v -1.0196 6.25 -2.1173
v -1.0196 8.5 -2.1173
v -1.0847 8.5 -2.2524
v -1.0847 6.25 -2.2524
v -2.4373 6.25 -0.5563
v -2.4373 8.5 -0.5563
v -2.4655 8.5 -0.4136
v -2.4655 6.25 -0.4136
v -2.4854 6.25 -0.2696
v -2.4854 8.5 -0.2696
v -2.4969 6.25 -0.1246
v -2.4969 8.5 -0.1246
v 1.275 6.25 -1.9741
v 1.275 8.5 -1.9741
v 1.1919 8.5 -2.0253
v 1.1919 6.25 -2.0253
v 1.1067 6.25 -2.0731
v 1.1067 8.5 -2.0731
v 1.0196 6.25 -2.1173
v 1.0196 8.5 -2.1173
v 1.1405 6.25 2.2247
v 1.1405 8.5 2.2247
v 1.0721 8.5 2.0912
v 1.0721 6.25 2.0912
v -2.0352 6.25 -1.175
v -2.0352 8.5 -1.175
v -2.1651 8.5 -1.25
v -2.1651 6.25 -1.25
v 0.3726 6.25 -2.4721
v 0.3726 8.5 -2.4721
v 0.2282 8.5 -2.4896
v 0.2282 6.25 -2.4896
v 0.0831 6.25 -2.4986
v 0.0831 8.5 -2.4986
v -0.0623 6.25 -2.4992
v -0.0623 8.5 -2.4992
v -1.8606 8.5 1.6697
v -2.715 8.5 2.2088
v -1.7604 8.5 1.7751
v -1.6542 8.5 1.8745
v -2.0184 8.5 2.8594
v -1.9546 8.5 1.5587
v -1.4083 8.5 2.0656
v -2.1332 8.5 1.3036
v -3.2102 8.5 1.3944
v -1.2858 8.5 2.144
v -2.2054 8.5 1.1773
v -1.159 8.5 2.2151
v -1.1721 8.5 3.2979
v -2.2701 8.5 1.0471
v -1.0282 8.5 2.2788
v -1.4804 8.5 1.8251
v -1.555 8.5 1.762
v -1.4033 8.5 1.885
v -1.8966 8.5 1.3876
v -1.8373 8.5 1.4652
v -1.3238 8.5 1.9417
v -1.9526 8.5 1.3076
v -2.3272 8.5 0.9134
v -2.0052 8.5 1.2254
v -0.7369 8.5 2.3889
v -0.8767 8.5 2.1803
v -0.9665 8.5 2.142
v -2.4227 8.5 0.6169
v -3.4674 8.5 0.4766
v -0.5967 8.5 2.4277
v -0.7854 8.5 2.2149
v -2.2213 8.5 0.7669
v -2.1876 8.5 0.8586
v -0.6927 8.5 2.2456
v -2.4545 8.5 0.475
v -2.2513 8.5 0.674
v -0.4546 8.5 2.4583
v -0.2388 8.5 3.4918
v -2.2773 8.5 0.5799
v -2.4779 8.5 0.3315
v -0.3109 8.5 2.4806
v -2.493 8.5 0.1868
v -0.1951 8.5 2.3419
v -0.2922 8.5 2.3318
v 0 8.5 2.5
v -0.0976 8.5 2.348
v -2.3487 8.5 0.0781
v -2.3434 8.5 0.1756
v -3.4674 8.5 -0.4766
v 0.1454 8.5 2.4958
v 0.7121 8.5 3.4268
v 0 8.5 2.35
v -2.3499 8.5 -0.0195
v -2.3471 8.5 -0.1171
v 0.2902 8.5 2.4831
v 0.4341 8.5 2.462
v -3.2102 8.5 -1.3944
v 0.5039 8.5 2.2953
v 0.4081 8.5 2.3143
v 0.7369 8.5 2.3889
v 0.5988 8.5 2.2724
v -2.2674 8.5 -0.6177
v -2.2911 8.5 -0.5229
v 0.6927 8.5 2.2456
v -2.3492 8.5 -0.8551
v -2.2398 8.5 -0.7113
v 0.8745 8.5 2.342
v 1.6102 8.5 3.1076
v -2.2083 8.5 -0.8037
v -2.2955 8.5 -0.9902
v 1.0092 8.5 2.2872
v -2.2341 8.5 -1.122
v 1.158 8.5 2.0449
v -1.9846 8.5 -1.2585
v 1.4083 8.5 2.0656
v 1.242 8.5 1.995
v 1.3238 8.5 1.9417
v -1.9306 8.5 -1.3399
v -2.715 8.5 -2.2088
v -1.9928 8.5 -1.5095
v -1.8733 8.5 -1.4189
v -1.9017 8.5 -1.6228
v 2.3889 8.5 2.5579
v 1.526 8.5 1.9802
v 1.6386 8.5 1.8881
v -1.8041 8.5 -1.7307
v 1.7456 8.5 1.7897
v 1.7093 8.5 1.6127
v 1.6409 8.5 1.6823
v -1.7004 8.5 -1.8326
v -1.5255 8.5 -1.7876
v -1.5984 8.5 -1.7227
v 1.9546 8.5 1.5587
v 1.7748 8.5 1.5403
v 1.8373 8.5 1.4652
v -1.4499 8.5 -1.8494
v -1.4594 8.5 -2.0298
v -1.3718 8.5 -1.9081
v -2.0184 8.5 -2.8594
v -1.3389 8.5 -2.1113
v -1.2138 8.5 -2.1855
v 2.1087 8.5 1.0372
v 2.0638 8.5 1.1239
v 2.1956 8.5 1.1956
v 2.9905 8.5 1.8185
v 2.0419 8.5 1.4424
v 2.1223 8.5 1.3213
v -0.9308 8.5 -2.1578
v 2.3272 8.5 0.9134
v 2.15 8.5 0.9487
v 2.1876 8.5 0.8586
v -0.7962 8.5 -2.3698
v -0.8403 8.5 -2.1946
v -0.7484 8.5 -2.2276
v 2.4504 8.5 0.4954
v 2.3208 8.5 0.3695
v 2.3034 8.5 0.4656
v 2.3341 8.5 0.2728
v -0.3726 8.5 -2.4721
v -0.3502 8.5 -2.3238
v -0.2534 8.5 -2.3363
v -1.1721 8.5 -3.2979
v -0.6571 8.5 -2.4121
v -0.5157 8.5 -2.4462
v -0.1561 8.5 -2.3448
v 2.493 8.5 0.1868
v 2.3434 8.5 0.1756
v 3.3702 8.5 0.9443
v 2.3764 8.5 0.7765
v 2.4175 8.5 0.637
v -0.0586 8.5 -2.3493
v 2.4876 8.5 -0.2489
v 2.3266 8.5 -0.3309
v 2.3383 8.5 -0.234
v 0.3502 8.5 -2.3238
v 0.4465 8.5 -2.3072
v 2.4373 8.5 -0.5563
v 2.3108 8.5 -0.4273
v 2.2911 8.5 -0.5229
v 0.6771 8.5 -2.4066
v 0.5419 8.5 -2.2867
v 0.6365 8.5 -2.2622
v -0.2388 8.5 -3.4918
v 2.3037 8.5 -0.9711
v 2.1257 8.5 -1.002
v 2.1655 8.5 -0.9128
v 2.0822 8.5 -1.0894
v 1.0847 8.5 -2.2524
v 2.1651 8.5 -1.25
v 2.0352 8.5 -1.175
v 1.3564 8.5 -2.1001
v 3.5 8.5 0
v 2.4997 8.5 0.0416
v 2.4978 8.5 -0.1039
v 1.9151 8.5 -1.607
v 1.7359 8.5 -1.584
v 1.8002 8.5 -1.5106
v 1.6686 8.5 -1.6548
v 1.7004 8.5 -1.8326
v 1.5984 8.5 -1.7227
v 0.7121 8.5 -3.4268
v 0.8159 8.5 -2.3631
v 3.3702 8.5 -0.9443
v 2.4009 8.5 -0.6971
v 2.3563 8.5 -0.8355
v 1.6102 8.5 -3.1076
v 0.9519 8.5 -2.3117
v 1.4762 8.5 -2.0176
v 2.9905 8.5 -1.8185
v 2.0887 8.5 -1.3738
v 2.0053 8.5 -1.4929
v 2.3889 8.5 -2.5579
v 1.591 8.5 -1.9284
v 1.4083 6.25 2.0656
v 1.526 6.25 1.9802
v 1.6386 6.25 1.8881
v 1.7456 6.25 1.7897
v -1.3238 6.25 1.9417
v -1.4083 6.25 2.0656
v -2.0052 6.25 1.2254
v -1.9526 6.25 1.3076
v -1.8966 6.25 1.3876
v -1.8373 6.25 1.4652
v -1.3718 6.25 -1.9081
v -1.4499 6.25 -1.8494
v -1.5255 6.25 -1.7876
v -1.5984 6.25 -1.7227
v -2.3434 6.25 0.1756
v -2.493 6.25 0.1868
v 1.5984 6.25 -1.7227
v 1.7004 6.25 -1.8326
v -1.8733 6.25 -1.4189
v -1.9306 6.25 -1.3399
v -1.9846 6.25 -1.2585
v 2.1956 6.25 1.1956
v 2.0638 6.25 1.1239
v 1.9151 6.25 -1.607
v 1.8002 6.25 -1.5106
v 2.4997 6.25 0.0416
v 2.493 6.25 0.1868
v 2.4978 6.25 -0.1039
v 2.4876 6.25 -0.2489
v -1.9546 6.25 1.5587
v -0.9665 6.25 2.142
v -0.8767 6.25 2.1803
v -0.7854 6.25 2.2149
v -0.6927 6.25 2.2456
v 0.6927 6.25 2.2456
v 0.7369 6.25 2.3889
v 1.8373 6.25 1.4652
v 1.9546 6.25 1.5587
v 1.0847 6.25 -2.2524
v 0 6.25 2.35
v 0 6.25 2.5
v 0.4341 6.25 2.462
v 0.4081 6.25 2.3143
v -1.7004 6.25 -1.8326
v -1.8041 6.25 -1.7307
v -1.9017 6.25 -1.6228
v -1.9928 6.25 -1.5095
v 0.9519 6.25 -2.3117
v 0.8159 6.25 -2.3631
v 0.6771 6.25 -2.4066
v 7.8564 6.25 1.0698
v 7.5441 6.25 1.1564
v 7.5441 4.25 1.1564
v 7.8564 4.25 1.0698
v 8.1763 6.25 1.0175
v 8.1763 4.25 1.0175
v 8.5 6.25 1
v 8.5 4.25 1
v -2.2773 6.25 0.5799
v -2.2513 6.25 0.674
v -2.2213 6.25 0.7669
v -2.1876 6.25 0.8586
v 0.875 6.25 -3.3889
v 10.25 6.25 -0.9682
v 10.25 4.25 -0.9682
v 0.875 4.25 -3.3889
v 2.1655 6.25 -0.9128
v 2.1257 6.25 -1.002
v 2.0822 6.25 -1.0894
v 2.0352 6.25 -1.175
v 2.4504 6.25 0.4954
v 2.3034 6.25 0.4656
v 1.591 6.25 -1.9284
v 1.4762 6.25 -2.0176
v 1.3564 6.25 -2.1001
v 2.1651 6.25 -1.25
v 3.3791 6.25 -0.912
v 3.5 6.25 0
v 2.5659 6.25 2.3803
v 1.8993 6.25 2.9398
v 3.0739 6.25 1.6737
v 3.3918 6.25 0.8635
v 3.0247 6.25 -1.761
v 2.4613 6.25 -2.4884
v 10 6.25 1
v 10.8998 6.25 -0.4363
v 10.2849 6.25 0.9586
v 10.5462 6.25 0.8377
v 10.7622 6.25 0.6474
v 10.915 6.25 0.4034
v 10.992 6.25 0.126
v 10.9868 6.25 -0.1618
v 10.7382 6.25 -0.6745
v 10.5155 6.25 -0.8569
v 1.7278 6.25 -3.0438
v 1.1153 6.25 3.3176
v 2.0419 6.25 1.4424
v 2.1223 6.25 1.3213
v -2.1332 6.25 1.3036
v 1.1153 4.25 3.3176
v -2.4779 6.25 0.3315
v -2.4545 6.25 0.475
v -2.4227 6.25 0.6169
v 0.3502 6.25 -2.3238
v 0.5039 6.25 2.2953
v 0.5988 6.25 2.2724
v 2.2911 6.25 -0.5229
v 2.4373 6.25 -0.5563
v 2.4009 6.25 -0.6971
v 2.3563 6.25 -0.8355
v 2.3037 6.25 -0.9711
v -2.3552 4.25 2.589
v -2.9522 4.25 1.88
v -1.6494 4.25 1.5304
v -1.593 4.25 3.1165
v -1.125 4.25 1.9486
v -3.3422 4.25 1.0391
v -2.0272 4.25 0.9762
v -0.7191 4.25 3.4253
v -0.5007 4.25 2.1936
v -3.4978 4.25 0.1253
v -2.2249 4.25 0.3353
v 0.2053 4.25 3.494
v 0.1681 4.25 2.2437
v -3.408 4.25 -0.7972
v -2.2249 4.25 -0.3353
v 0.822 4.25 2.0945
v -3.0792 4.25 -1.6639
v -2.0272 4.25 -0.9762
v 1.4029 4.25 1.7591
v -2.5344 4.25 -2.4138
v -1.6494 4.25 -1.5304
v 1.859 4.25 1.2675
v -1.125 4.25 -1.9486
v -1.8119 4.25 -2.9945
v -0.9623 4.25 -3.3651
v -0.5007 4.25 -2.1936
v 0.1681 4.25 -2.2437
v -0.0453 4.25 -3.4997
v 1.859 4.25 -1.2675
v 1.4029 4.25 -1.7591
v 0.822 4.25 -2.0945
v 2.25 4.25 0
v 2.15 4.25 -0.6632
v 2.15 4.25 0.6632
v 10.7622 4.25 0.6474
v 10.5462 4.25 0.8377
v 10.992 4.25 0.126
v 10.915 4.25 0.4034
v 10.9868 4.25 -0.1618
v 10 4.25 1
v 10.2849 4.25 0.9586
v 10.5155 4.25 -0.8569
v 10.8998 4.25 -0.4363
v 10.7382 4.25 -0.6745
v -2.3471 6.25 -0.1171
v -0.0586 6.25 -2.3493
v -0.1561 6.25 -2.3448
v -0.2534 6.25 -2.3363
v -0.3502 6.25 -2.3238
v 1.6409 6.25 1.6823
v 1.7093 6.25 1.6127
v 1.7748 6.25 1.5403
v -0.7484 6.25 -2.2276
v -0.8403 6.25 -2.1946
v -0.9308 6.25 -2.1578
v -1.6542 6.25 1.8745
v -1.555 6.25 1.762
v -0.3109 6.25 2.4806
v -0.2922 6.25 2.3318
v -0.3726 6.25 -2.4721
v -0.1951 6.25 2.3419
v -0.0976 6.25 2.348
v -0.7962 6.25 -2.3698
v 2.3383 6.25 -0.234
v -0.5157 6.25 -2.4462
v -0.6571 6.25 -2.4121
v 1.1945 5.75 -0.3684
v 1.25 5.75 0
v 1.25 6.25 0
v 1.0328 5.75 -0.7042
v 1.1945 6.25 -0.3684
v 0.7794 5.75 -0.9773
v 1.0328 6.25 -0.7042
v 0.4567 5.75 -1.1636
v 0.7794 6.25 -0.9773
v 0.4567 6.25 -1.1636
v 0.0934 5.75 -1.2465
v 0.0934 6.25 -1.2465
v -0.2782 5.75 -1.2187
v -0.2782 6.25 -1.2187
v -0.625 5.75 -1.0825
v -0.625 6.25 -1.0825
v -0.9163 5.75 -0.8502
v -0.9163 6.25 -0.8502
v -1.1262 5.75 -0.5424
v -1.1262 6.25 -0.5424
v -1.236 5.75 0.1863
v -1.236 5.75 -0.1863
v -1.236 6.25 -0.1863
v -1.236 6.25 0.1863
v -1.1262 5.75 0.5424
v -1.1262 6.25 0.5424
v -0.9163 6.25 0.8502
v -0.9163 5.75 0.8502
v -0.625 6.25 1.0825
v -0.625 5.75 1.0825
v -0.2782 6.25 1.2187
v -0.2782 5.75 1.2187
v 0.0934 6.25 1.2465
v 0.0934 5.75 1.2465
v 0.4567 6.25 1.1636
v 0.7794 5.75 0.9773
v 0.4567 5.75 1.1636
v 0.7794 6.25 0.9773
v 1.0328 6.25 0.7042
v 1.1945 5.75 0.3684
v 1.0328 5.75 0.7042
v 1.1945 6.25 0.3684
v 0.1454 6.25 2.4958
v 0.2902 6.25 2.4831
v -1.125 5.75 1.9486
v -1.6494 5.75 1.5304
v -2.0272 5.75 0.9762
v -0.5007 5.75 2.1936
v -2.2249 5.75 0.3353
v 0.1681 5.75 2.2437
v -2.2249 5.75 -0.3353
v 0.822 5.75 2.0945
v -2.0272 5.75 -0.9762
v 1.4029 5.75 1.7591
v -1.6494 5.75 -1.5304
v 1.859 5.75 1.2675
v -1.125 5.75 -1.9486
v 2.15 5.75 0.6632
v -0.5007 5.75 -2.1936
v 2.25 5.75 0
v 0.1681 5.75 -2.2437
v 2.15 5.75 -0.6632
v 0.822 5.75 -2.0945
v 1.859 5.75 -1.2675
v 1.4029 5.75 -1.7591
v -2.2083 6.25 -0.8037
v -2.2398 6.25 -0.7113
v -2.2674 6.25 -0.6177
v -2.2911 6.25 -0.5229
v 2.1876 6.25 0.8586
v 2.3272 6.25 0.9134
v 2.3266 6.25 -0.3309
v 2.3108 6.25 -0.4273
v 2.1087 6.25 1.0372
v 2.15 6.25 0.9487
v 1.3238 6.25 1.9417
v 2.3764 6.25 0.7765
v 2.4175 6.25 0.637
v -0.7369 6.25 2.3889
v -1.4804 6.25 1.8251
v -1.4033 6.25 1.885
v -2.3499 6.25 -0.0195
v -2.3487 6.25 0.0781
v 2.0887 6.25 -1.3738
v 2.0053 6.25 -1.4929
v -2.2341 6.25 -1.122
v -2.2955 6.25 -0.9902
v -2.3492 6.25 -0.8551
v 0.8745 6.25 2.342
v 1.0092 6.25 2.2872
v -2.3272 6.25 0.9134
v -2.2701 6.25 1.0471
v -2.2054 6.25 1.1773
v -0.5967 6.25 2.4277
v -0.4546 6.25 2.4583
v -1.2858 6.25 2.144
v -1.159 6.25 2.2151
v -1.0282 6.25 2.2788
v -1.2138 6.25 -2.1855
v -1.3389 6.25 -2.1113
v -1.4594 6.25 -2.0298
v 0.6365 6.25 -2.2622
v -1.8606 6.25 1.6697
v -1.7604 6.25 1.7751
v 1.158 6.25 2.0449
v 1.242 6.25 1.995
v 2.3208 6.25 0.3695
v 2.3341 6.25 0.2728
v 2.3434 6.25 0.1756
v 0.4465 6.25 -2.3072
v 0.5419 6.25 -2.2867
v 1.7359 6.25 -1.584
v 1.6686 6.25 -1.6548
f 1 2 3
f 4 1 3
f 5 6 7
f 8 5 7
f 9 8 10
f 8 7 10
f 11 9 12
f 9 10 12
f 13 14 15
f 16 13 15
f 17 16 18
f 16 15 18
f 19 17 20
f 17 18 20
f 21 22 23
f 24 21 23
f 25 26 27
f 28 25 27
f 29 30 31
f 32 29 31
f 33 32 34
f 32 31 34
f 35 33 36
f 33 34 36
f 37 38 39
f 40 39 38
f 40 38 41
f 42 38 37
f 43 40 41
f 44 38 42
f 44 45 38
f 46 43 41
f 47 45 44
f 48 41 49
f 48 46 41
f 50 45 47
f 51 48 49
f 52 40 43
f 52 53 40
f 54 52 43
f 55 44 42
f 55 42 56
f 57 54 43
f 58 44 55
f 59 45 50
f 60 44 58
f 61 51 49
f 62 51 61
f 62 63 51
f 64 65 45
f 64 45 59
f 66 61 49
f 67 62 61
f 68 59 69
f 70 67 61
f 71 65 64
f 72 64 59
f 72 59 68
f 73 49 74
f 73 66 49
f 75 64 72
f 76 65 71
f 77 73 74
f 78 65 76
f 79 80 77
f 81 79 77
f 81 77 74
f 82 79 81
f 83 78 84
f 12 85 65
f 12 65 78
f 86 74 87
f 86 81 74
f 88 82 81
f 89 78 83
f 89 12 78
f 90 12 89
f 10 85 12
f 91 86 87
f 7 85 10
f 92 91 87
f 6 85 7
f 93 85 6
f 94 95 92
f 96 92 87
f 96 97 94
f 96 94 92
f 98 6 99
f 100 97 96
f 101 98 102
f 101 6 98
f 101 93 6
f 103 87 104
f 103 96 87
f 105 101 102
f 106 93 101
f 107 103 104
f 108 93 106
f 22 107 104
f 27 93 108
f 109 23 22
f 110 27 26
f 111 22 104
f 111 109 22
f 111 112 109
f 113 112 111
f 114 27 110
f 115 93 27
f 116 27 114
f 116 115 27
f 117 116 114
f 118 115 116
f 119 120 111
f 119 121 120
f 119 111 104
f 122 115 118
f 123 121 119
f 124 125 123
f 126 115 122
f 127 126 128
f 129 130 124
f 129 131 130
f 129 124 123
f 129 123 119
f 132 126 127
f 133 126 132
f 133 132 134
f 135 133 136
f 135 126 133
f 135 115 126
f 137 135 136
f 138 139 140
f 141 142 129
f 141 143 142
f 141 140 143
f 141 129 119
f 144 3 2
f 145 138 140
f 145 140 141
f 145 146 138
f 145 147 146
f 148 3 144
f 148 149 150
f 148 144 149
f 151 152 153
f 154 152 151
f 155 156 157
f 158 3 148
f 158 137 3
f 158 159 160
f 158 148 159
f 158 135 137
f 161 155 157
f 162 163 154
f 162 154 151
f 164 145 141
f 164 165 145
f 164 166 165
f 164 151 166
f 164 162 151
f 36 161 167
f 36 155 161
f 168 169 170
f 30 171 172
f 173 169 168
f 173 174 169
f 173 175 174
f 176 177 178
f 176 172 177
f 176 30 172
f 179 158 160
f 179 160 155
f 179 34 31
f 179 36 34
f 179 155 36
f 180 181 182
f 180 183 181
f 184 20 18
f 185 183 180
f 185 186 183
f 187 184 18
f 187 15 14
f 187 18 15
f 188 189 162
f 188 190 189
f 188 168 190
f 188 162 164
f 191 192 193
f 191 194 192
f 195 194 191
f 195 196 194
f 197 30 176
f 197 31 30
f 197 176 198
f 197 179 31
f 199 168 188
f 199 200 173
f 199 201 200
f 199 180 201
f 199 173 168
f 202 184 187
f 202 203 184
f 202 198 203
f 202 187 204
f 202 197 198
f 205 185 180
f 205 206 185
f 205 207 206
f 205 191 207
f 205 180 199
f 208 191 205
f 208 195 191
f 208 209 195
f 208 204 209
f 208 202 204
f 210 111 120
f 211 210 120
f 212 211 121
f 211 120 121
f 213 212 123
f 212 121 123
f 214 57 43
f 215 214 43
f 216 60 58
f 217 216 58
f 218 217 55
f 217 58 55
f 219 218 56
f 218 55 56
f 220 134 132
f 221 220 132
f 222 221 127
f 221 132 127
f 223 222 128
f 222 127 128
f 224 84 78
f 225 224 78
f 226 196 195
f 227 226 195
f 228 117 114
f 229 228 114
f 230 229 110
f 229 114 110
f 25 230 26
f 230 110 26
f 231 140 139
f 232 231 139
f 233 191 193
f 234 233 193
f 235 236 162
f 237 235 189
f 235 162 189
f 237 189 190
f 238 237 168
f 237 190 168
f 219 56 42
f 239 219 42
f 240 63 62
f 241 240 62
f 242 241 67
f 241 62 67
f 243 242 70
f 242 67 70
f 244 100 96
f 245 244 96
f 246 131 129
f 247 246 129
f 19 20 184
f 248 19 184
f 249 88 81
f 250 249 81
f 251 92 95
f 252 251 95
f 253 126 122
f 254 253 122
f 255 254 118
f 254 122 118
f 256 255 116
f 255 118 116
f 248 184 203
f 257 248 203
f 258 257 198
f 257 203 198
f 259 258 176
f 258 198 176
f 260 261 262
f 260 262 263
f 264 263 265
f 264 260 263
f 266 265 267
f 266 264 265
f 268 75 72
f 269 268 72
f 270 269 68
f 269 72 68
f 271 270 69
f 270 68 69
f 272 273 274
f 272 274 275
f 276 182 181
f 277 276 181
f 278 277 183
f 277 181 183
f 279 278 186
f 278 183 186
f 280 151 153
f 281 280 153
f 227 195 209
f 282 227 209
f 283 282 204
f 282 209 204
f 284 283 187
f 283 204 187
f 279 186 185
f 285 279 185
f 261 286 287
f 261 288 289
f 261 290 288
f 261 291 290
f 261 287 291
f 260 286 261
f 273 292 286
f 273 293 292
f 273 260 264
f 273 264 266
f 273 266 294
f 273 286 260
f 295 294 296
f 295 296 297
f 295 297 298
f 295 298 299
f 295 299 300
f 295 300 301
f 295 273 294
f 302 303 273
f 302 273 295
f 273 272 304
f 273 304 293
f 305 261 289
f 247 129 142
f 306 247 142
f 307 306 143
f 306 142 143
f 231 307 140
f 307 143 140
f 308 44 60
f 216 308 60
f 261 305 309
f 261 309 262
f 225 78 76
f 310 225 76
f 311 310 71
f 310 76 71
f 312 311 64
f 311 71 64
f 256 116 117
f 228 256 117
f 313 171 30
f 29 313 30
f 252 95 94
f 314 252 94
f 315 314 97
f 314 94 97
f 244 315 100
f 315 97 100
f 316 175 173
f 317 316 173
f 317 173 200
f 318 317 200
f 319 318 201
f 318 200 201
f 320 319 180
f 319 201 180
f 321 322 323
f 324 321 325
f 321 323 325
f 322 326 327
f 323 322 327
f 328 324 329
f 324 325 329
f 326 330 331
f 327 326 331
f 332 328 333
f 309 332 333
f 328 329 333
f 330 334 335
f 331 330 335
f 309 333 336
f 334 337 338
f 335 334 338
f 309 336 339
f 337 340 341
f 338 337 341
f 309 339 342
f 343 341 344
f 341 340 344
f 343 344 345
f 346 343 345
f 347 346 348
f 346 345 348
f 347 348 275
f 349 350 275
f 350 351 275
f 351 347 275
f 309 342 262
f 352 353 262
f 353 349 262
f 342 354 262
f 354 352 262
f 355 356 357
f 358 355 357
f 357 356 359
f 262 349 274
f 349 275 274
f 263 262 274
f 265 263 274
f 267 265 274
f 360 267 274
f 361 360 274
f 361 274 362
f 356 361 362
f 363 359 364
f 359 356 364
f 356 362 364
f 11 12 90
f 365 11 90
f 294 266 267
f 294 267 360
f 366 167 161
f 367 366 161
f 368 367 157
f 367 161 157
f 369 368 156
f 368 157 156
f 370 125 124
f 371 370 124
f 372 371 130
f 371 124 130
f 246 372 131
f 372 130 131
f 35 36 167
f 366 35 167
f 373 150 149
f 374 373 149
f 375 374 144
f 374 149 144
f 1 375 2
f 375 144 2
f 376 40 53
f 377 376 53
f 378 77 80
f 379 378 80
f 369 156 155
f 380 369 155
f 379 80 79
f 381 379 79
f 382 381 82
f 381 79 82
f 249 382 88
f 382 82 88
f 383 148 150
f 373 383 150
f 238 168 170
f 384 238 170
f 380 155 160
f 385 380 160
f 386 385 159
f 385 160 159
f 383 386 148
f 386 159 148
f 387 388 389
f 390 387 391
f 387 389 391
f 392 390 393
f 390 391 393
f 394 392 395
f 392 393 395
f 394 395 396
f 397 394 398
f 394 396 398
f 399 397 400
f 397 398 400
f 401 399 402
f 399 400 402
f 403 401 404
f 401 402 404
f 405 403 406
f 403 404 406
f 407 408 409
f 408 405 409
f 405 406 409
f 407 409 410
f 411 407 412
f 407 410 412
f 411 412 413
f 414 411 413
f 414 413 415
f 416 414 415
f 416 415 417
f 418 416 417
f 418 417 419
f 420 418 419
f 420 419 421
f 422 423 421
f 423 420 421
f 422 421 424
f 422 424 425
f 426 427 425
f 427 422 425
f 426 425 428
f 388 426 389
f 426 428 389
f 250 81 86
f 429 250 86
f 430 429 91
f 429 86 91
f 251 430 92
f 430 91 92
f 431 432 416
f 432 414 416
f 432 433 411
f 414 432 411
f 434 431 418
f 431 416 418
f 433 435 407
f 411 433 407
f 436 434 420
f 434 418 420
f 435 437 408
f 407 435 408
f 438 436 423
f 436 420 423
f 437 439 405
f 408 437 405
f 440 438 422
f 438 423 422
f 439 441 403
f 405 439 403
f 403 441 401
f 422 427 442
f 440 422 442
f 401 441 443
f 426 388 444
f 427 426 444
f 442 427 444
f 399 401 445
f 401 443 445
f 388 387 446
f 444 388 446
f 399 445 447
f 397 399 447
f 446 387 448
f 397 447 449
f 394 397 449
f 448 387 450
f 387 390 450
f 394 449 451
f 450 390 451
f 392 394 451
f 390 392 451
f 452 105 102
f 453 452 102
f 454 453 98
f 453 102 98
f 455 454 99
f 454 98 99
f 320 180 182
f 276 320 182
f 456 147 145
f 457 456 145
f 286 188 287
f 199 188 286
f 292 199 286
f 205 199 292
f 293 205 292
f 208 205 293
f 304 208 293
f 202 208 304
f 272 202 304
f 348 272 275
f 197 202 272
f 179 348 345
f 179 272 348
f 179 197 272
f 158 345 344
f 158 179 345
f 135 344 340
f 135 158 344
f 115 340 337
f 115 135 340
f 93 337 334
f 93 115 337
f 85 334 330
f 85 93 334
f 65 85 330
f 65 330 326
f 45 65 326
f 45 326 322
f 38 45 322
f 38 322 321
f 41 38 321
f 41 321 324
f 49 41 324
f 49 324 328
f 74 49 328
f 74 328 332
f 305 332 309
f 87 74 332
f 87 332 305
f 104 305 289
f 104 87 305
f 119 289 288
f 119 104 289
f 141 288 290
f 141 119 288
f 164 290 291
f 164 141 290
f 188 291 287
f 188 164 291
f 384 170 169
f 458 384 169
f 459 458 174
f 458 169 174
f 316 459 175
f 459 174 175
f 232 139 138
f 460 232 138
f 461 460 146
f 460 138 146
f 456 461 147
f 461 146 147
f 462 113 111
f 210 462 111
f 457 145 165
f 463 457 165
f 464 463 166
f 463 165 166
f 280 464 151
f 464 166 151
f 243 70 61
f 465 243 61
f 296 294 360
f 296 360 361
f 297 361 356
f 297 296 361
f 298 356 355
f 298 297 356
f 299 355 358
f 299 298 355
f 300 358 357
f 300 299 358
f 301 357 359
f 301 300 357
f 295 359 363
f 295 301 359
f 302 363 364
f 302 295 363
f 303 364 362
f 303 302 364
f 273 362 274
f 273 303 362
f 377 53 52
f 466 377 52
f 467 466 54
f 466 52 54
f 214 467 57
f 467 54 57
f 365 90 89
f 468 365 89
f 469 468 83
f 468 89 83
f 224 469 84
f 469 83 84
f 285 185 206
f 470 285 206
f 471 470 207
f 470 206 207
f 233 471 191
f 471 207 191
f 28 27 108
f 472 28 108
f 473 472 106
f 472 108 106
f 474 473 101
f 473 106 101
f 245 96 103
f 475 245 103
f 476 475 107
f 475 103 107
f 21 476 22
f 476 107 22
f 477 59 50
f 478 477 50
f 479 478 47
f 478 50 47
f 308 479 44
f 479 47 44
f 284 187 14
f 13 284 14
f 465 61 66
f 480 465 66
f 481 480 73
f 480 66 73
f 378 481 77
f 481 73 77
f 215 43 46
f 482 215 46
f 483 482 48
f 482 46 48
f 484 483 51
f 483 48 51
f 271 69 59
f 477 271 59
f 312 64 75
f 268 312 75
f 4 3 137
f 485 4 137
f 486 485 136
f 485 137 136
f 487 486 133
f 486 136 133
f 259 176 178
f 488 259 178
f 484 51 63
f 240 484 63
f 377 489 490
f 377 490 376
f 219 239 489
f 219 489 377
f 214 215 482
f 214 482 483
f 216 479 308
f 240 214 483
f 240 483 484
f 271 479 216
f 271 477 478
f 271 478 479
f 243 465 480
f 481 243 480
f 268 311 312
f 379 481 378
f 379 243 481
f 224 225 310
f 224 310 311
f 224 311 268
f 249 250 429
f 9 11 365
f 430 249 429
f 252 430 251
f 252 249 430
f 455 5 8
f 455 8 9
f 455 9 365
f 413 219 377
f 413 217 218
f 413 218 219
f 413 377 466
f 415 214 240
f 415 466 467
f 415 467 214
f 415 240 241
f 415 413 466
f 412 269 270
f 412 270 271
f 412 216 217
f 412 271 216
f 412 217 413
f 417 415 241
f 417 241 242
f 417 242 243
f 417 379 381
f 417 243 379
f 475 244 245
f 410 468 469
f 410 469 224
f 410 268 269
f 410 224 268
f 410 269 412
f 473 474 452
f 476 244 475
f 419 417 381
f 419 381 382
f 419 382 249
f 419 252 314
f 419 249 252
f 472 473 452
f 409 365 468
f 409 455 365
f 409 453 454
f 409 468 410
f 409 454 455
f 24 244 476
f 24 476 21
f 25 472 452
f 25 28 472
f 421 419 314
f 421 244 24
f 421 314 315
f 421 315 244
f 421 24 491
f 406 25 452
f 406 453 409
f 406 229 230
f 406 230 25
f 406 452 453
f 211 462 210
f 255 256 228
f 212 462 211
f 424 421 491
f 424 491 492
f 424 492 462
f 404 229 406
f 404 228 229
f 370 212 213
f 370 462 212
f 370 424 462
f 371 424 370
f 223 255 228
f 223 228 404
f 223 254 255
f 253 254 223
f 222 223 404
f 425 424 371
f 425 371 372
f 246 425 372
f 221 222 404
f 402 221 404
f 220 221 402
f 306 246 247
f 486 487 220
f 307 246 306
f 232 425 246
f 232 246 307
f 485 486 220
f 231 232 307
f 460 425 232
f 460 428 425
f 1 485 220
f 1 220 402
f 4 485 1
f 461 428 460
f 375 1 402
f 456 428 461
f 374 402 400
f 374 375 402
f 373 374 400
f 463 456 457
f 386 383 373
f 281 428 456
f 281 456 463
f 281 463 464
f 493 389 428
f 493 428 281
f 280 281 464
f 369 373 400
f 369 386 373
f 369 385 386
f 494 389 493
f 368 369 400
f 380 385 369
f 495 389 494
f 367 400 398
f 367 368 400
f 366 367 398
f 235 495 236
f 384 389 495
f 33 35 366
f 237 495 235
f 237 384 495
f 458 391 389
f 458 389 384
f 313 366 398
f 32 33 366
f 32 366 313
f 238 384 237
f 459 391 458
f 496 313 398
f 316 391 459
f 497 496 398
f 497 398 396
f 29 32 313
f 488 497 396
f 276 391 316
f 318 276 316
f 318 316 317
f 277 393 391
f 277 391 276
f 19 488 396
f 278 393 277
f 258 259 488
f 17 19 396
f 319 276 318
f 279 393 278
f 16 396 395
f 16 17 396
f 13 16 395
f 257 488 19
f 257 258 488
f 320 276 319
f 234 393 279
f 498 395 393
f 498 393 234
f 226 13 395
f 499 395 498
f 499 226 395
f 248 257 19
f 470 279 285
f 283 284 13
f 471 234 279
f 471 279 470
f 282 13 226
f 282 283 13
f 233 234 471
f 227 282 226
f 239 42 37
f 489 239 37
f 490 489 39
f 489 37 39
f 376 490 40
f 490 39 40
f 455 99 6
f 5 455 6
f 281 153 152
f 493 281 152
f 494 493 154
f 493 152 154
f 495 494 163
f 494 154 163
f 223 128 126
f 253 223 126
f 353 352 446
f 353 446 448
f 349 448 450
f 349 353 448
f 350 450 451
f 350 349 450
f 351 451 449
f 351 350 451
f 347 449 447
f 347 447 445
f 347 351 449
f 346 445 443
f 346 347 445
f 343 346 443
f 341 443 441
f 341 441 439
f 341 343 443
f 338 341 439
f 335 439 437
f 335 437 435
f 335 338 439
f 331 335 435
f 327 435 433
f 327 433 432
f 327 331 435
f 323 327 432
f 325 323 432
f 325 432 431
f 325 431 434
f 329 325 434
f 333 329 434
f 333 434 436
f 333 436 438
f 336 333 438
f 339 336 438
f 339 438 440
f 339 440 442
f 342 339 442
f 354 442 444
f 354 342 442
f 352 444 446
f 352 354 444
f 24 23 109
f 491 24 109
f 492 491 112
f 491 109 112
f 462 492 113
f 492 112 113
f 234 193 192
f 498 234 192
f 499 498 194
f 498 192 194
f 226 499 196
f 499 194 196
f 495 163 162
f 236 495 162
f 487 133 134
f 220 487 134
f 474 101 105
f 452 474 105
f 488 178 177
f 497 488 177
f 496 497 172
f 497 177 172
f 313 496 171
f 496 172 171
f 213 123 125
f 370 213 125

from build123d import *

# Parameters (mm, degrees)
SKETCH1_R           = 3.5
SKETCH1_R_2         = 2.5
BOSS_EXTRUDE1_DEPTH = 2.25
BOSS_EXTRUDE4_DEPTH = 2.25
BOSS_EXTRUDE2_START = 2.25
BOSS_EXTRUDE2_DEPTH = 2
SKETCH3_R           = 3.5
SKETCH3_R_2         = 1.25
BOSS_EXTRUDE3_DEPTH = 2
SKETCH4_R           = 2.25
CUT_EXTRUDE1_DEPTH  = 1.5


with BuildPart() as part:
    # Sketch1 → Boss-Extrude1 (new body)
    with BuildSketch(Plane(origin=(0, 0, 0), x_dir=(1, 0, 0), z_dir=(0, 1, 0))):
        Circle(SKETCH1_R)
        Circle(SKETCH1_R_2, mode=Mode.SUBTRACT)
    extrude(amount=BOSS_EXTRUDE1_DEPTH)

    # Sketch6 → Boss-Extrude4 (add)
    with BuildSketch(Plane.XZ):
        with BuildLine():
            Line((0.434120444, 2.462019383), (0.408073218, 2.31429822))
            ThreePointArc((0.408073218, 2.31429822), (0.551444891, 2.284383622), (0.69267466, 2.245596094))
            Line((0.69267466, 2.245596094), (0.736887936, 2.388932014))
            ThreePointArc((0.736887936, 2.388932014), (0.586643501, 2.430195342), (0.434120444, 2.462019383))
        make_face()
        with BuildLine():
            Line((1.140526643, 2.224679522), (1.072095045, 2.091198751))
            ThreePointArc((1.072095045, 2.091198751), (1.200279635, 2.020353632), (1.323802136, 1.94166112))
            Line((1.323802136, 1.94166112), (1.408300145, 2.065596936))
            ThreePointArc((1.408300145, 2.065596936), (1.276893228, 2.149312375), (1.140526643, 2.224679522))
        make_face()
        with BuildLine():
            Line((1.745592045, 1.789667123), (1.640856523, 1.682287096))
            ThreePointArc((1.640856523, 1.682287096), (1.742464265, 1.576806356), (1.837303984, 1.465201034))
            Line((1.837303984, 1.465201034), (1.954578706, 1.558724505))
            ThreePointArc((1.954578706, 1.558724505), (1.853685389, 1.67745357), (1.745592045, 1.789667123))
        make_face()
        with BuildLine():
            Line((2.195553933, 1.195634947), (2.063820697, 1.12389685))
            ThreePointArc((2.063820697, 1.12389685), (2.1298233, 0.993152915), (2.187553309, 0.858551407))
            Line((2.187553309, 0.858551407), (2.327184372, 0.913352561))
            ThreePointArc((2.327184372, 0.913352561), (2.265769468, 1.056545654), (2.195553933, 1.195634947))
        make_face()
        with BuildLine():
            Line((2.45043122, 0.495365358), (2.303405346, 0.465643437))
            ThreePointArc((2.303405346, 0.465643437), (2.327938187, 0.32125348), (2.343428923, 0.17561572))
            Line((2.343428923, 0.17561572), (2.493009493, 0.186825234))
            ThreePointArc((2.493009493, 0.186825234), (2.476529986, 0.341759021), (2.45043122, 0.495365358))
        make_face()
        with BuildLine():
            Line((2.487576938, -0.248919616), (2.338322322, -0.23398444))
            ThreePointArc((2.338322322, -0.23398444), (2.31920555, -0.379190737), (2.291080594, -0.522924195))
            Line((2.291080594, -0.522924195), (2.43731978, -0.556302335))
            ThreePointArc((2.43731978, -0.556302335), (2.467239947, -0.403394402), (2.487576938, -0.248919616))
        make_face()
        with BuildLine():
            Line((2.30369053, -0.971086991), (2.165469098, -0.912821771))
            ThreePointArc((2.165469098, -0.912821771), (2.104401323, -1.045942193), (2.035159699, -1.175))
            Line((2.035159699, -1.175), (2.165063509, -1.25))
            ThreePointArc((2.165063509, -1.25), (2.238724812, -1.112704461), (2.30369053, -0.971086991))
        make_face()
        with BuildLine():
            Line((1.915111108, -1.606969024), (1.800204441, -1.510550883))
            ThreePointArc((1.800204441, -1.510550883), (1.702611803, -1.619757095), (1.598405934, -1.722671899))
            Line((1.598405934, -1.722671899), (1.700431844, -1.83262968))
            ThreePointArc((1.700431844, -1.83262968), (1.811289152, -1.723145846), (1.915111108, -1.606969024))
        make_face()
        with BuildLine():
            Line((1.35636566, -2.100064808), (1.27498372, -1.974060919))
            ThreePointArc((1.27498372, -1.974060919), (1.149537753, -2.049649471), (1.019626787, -2.11727684))
            Line((1.019626787, -2.11727684), (1.084709348, -2.25242217))
            ThreePointArc((1.084709348, -2.25242217), (1.222912503, -2.180478161), (1.35636566, -2.100064808))
        make_face()
        with BuildLine():
            Line((0.67710117, -2.406560617), (0.6364751, -2.26216698))
            ThreePointArc((0.6364751, -2.26216698), (0.494322228, -2.297421497), (0.350249326, -2.323752442))
            Line((0.350249326, -2.323752442), (0.372605665, -2.472077066))
            ThreePointArc((0.372605665, -2.472077066), (0.525874711, -2.444065422), (0.67710117, -2.406560617))
        make_face()
        with BuildLine():
            Line((-0.062326729, -2.499222955), (-0.058587126, -2.349269578))
            ThreePointArc((-0.058587126, -2.349269578), (-0.204815995, -2.341057541), (-0.350249326, -2.323752442))
            Line((-0.350249326, -2.323752442), (-0.372605665, -2.472077066))
            ThreePointArc((-0.372605665, -2.472077066), (-0.217889357, -2.490486745), (-0.062326729, -2.499222955))
        make_face()
        with BuildLine():
            Line((-0.796216626, -2.369818365), (-0.748443628, -2.227629263))
            ThreePointArc((-0.748443628, -2.227629263), (-0.885755419, -2.176680348), (-1.019626787, -2.11727684))
            Line((-1.019626787, -2.11727684), (-1.084709348, -2.25242217))
            ThreePointArc((-1.084709348, -2.25242217), (-0.942292999, -2.315617392), (-0.796216626, -2.369818365))
        make_face()
        with BuildLine():
            Line((-1.459359181, -2.029845014), (-1.37179763, -1.908054313))
            ThreePointArc((-1.37179763, -1.908054313), (-1.487991587, -1.818895554), (-1.598405934, -1.722671899))
            Line((-1.598405934, -1.722671899), (-1.700431844, -1.83262968))
            ThreePointArc((-1.700431844, -1.83262968), (-1.582969773, -1.934995271), (-1.459359181, -2.029845014))
        make_face()
        with BuildLine():
            Line((-1.992831268, -1.509511026), (-1.873261392, -1.418940364))
            ThreePointArc((-1.873261392, -1.418940364), (-1.958013172, -1.299493909), (-2.035159699, -1.175))
            Line((-2.035159699, -1.175), (-2.165063509, -1.25))
            ThreePointArc((-2.165063509, -1.25), (-2.082992736, -1.382440328), (-1.992831268, -1.509511026))
        make_face()
        with BuildLine():
            Line((-2.349231552, -0.855050358), (-2.208277659, -0.803747337))
            ThreePointArc((-2.208277659, -0.803747337), (-2.254056694, -0.664626526), (-2.291080594, -0.522924195))
            Line((-2.291080594, -0.522924195), (-2.43731978, -0.556302335))
            ThreePointArc((-2.43731978, -0.556302335), (-2.397932653, -0.707049496), (-2.349231552, -0.855050358))
        make_face()
        with BuildLine():
            Line((-2.496892303, -0.124614714), (-2.347078765, -0.117137831))
            ThreePointArc((-2.347078765, -0.117137831), (-2.349817387, 0.029295839), (-2.343428923, 0.17561572))
            Line((-2.343428923, 0.17561572), (-2.493009493, 0.186825234))
            ThreePointArc((-2.493009493, 0.186825234), (-2.499805731, 0.031165786), (-2.496892303, -0.124614714))
        make_face()
        with BuildLine():
            Line((-2.422693216, 0.616893494), (-2.277331623, 0.579879885))
            ThreePointArc((-2.277331623, 0.579879885), (-2.236786494, 0.720615141), (-2.187553309, 0.858551407))
            Line((-2.187553309, 0.858551407), (-2.327184372, 0.913352561))
            ThreePointArc((-2.327184372, 0.913352561), (-2.3795601, 0.766611852), (-2.422693216, 0.616893494))
        make_face()
        with BuildLine():
            Line((-2.133227204, 1.303588008), (-2.005233572, 1.225372728))
            ThreePointArc((-2.005233572, 1.225372728), (-1.925007304, 1.347904625), (-1.837303984, 1.465201034))
            Line((-1.837303984, 1.465201034), (-1.954578706, 1.558724505))
            ThreePointArc((-1.954578706, 1.558724505), (-2.047880111, 1.433941091), (-2.133227204, 1.303588008))
        make_face()
        with BuildLine():
            Line((-1.654214594, 1.874453007), (-1.554961718, 1.761985827))
            ThreePointArc((-1.554961718, 1.761985827), (-1.442182768, 1.855426869), (-1.323802136, 1.94166112))
            Line((-1.323802136, 1.94166112), (-1.408300145, 2.065596936))
            ThreePointArc((-1.408300145, 2.065596936), (-1.534236987, 1.973858371), (-1.654214594, 1.874453007))
        make_face()
        with BuildLine():
            Line((-1.028217758, 2.278764631), (-0.966524692, 2.142038753))
            ThreePointArc((-0.966524692, 2.142038753), (-0.831213964, 2.198086292), (-0.69267466, 2.245596094))
            Line((-0.69267466, 2.245596094), (-0.736887936, 2.388932014))
            ThreePointArc((-0.736887936, 2.388932014), (-0.884270174, 2.338389672), (-1.028217758, 2.278764631))
        make_face()
        with BuildLine():
            Line((-0.310859262, 2.480598017), (-0.292207706, 2.331762136))
            ThreePointArc((-0.292207706, 2.331762136), (-0.146388151, 2.345436102), (0, 2.35))
            Line((0, 2.35), (0, 2.5))
            ThreePointArc((0, 2.5), (-0.155732076, 2.49514479), (-0.310859262, 2.480598017))
        make_face()
    extrude(amount=-BOSS_EXTRUDE4_DEPTH)



with BuildPart() as body_2:
    # Sketch2 → Boss-Extrude2 (new body)
    with BuildSketch(Plane(origin=(0, 0, 0), x_dir=(1, 0, 0), z_dir=(0, 1, 0)).offset(BOSS_EXTRUDE2_START)):
        with BuildLine():
            Line((10.25, 0.968245837), (0.875, 3.388860428))
            ThreePointArc((0.875, 3.388860428), (3.497755962, 0.12531253), (1.115267765, -3.317556))
            Line((1.115267765, -3.317556), (7.544056202, -1.156380571))
            ThreePointArc((7.544056202, -1.156380571), (8.015674844, -1.039353256), (8.5, -1))
            Line((8.5, -1), (10, -1))
            ThreePointArc((10, -1), (10.992029696, -0.126004292), (10.25, 0.968245837))
        make_face()
    extrude(amount=BOSS_EXTRUDE2_DEPTH)


with BuildPart() as part_1:
    add(part.part)

    add(body_2.part)  # Boss-Extrude3 merges body 2
    # Sketch3 → Boss-Extrude3 (add)
    with BuildSketch(Plane(origin=(0, 2.25, 0), x_dir=(1, 0, 0), z_dir=(0, 1, 0))):
        Circle(SKETCH3_R)
        Circle(SKETCH3_R_2, mode=Mode.SUBTRACT)
    extrude(amount=BOSS_EXTRUDE3_DEPTH)

    # Sketch4 → Cut-Extrude1 (cut)
    with BuildSketch(Plane(origin=(0, 4.25, 0), x_dir=(1, 0, 0), z_dir=(0, 1, 0))):
        Circle(SKETCH4_R)
    extrude(amount=-CUT_EXTRUDE1_DEPTH, mode=Mode.SUBTRACT)


with BuildPart() as body_2_2:
    # Mirror1: mirrored copy
    add(part_1.part.mirror(Plane(origin=(3.303845643, 4.25, -0.0910361), x_dir=(0, 0, 1), z_dir=(0, 1, 0))))


solid = body_2_2.part
